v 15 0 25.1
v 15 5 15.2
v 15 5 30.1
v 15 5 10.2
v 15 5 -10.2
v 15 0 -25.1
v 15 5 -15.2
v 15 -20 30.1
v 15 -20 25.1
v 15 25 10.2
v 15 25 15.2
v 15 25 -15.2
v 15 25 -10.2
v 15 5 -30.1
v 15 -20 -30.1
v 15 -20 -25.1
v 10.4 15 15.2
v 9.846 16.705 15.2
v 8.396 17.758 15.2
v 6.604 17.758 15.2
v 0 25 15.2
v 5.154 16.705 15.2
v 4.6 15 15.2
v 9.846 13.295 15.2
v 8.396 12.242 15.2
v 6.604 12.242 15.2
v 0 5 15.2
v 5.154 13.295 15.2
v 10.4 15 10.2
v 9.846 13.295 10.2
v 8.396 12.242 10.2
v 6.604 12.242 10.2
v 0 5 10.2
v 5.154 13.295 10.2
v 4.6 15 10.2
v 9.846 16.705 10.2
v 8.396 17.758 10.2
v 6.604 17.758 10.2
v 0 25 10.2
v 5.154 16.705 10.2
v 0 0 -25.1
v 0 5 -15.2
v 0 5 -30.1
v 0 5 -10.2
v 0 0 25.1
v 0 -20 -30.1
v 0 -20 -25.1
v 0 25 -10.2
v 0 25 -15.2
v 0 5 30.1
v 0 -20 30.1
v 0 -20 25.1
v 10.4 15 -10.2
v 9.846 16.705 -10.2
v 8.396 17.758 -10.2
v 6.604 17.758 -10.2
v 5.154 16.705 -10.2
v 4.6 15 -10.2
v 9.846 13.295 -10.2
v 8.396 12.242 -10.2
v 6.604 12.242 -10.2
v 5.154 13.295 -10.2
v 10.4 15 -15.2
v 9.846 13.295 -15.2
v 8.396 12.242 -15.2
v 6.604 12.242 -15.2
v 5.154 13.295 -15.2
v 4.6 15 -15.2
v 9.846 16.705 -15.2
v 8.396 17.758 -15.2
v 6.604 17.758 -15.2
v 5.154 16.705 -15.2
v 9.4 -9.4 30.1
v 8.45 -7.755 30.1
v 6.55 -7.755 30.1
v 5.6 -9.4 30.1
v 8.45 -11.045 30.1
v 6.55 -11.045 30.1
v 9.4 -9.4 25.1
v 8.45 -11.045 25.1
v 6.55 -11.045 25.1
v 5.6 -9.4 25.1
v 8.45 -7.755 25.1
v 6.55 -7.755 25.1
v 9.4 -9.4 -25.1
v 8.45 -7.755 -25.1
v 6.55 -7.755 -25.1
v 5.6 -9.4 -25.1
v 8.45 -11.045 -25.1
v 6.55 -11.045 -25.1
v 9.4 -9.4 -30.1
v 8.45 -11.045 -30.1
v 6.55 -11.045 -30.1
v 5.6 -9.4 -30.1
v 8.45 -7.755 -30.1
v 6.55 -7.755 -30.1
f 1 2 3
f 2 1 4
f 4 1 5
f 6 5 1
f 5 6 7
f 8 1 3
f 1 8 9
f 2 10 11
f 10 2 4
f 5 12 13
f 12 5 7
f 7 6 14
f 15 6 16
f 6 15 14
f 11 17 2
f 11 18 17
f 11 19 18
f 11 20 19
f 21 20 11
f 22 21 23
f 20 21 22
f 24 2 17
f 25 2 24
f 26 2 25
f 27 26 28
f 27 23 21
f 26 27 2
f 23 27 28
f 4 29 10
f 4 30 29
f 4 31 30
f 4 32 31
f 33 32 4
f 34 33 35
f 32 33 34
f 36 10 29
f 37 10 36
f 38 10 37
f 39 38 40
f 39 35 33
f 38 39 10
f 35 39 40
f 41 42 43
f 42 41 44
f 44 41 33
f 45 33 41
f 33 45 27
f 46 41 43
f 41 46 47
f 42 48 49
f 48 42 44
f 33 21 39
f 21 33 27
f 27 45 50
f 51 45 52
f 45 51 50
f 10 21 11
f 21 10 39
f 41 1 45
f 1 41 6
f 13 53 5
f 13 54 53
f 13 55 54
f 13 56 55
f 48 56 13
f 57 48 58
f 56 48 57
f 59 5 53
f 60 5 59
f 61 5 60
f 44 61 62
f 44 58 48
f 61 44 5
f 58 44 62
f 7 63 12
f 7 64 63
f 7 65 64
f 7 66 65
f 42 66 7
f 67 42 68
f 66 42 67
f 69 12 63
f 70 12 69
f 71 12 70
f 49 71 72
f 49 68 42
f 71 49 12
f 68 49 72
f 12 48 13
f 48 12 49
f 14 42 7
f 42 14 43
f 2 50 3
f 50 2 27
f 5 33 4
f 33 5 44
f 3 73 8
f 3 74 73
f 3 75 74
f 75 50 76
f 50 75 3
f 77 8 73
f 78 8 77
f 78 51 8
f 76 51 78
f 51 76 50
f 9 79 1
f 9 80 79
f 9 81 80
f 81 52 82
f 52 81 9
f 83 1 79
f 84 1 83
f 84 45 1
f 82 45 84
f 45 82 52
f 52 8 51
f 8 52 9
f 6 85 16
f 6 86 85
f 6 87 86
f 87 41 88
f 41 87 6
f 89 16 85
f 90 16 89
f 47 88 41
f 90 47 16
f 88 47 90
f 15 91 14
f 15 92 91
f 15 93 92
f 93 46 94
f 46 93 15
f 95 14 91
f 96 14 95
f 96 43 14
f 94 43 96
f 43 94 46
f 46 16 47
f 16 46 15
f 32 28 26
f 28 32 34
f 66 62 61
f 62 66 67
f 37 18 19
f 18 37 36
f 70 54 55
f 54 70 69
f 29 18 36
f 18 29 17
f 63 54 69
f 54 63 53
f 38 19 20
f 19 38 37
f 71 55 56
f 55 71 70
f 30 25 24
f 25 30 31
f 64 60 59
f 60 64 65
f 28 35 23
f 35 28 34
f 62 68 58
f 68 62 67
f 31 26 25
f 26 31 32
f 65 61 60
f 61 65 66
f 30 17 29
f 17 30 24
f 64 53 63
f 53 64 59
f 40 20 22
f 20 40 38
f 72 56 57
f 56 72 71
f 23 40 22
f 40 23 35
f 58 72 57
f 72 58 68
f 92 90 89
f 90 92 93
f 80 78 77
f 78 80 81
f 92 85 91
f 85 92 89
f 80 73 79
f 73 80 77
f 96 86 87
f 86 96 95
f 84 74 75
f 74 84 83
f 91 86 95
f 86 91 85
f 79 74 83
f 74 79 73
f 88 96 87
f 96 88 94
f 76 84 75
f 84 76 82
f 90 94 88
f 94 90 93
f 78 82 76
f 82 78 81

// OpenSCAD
Epaisseur = 5;  // Epaisseur (mm)
Hauteur = 50.2;   // Hauteur du power supply (mm)
Largeur = 15;   // Largeur du support (mm)
Diametre = 5+0.8;   // Diametre du trou pour la vis (mm)
Epaisseur_Renfort = 3; // Epaisseur du renfort (mm)
longeur_support = 20;



difference(){
// Support
union(){
    translate([0,0,10.2])
    cube([Largeur,20+Epaisseur,Epaisseur],false);
    translate([0,0,-10-0.2-Epaisseur])
    cube([Largeur,20+Epaisseur,Epaisseur],false);
    
    translate([0,0,-Hauteur/2-Epaisseur/2])
    cube([Largeur,Epaisseur,Hauteur+Epaisseur],false);
    
    translate([0,-(longeur_support),Hauteur/2])
    cube([Largeur,longeur_support+Epaisseur,Epaisseur],false);
    
    translate([0,-(longeur_support),-Hauteur/2-1*Epaisseur])
    cube([Largeur,longeur_support+Epaisseur,Epaisseur],false);

// Renfort
    /*
    hull(){
    polyhedron
        (points = [
                [Largeur,Epaisseur,Epaisseur],                    //0
                [Largeur,Epaisseur,Epaisseur+Epaisseur_Renfort],  //1
                [Largeur,Epaisseur+Epaisseur_Renfort,Epaisseur],  //2
                [0,Epaisseur,Epaisseur],                          //3
                [0,Epaisseur,Epaisseur+Epaisseur_Renfort],        //4
                [0,Epaisseur+Epaisseur_Renfort,Epaisseur]],       //5
                
        faces =[ 
                [0,1,2], [3,5,4], [1,4,2], [2,4,5]
               ]
        );
    }
*/
}
// Trou pour la vis
translate([Largeur/2,Epaisseur+10,-20])
#cylinder(40, d = Diametre, true);

translate([Largeur/2,-9.4,-40])
#cylinder(80, d = 3+0.8, true);
}
